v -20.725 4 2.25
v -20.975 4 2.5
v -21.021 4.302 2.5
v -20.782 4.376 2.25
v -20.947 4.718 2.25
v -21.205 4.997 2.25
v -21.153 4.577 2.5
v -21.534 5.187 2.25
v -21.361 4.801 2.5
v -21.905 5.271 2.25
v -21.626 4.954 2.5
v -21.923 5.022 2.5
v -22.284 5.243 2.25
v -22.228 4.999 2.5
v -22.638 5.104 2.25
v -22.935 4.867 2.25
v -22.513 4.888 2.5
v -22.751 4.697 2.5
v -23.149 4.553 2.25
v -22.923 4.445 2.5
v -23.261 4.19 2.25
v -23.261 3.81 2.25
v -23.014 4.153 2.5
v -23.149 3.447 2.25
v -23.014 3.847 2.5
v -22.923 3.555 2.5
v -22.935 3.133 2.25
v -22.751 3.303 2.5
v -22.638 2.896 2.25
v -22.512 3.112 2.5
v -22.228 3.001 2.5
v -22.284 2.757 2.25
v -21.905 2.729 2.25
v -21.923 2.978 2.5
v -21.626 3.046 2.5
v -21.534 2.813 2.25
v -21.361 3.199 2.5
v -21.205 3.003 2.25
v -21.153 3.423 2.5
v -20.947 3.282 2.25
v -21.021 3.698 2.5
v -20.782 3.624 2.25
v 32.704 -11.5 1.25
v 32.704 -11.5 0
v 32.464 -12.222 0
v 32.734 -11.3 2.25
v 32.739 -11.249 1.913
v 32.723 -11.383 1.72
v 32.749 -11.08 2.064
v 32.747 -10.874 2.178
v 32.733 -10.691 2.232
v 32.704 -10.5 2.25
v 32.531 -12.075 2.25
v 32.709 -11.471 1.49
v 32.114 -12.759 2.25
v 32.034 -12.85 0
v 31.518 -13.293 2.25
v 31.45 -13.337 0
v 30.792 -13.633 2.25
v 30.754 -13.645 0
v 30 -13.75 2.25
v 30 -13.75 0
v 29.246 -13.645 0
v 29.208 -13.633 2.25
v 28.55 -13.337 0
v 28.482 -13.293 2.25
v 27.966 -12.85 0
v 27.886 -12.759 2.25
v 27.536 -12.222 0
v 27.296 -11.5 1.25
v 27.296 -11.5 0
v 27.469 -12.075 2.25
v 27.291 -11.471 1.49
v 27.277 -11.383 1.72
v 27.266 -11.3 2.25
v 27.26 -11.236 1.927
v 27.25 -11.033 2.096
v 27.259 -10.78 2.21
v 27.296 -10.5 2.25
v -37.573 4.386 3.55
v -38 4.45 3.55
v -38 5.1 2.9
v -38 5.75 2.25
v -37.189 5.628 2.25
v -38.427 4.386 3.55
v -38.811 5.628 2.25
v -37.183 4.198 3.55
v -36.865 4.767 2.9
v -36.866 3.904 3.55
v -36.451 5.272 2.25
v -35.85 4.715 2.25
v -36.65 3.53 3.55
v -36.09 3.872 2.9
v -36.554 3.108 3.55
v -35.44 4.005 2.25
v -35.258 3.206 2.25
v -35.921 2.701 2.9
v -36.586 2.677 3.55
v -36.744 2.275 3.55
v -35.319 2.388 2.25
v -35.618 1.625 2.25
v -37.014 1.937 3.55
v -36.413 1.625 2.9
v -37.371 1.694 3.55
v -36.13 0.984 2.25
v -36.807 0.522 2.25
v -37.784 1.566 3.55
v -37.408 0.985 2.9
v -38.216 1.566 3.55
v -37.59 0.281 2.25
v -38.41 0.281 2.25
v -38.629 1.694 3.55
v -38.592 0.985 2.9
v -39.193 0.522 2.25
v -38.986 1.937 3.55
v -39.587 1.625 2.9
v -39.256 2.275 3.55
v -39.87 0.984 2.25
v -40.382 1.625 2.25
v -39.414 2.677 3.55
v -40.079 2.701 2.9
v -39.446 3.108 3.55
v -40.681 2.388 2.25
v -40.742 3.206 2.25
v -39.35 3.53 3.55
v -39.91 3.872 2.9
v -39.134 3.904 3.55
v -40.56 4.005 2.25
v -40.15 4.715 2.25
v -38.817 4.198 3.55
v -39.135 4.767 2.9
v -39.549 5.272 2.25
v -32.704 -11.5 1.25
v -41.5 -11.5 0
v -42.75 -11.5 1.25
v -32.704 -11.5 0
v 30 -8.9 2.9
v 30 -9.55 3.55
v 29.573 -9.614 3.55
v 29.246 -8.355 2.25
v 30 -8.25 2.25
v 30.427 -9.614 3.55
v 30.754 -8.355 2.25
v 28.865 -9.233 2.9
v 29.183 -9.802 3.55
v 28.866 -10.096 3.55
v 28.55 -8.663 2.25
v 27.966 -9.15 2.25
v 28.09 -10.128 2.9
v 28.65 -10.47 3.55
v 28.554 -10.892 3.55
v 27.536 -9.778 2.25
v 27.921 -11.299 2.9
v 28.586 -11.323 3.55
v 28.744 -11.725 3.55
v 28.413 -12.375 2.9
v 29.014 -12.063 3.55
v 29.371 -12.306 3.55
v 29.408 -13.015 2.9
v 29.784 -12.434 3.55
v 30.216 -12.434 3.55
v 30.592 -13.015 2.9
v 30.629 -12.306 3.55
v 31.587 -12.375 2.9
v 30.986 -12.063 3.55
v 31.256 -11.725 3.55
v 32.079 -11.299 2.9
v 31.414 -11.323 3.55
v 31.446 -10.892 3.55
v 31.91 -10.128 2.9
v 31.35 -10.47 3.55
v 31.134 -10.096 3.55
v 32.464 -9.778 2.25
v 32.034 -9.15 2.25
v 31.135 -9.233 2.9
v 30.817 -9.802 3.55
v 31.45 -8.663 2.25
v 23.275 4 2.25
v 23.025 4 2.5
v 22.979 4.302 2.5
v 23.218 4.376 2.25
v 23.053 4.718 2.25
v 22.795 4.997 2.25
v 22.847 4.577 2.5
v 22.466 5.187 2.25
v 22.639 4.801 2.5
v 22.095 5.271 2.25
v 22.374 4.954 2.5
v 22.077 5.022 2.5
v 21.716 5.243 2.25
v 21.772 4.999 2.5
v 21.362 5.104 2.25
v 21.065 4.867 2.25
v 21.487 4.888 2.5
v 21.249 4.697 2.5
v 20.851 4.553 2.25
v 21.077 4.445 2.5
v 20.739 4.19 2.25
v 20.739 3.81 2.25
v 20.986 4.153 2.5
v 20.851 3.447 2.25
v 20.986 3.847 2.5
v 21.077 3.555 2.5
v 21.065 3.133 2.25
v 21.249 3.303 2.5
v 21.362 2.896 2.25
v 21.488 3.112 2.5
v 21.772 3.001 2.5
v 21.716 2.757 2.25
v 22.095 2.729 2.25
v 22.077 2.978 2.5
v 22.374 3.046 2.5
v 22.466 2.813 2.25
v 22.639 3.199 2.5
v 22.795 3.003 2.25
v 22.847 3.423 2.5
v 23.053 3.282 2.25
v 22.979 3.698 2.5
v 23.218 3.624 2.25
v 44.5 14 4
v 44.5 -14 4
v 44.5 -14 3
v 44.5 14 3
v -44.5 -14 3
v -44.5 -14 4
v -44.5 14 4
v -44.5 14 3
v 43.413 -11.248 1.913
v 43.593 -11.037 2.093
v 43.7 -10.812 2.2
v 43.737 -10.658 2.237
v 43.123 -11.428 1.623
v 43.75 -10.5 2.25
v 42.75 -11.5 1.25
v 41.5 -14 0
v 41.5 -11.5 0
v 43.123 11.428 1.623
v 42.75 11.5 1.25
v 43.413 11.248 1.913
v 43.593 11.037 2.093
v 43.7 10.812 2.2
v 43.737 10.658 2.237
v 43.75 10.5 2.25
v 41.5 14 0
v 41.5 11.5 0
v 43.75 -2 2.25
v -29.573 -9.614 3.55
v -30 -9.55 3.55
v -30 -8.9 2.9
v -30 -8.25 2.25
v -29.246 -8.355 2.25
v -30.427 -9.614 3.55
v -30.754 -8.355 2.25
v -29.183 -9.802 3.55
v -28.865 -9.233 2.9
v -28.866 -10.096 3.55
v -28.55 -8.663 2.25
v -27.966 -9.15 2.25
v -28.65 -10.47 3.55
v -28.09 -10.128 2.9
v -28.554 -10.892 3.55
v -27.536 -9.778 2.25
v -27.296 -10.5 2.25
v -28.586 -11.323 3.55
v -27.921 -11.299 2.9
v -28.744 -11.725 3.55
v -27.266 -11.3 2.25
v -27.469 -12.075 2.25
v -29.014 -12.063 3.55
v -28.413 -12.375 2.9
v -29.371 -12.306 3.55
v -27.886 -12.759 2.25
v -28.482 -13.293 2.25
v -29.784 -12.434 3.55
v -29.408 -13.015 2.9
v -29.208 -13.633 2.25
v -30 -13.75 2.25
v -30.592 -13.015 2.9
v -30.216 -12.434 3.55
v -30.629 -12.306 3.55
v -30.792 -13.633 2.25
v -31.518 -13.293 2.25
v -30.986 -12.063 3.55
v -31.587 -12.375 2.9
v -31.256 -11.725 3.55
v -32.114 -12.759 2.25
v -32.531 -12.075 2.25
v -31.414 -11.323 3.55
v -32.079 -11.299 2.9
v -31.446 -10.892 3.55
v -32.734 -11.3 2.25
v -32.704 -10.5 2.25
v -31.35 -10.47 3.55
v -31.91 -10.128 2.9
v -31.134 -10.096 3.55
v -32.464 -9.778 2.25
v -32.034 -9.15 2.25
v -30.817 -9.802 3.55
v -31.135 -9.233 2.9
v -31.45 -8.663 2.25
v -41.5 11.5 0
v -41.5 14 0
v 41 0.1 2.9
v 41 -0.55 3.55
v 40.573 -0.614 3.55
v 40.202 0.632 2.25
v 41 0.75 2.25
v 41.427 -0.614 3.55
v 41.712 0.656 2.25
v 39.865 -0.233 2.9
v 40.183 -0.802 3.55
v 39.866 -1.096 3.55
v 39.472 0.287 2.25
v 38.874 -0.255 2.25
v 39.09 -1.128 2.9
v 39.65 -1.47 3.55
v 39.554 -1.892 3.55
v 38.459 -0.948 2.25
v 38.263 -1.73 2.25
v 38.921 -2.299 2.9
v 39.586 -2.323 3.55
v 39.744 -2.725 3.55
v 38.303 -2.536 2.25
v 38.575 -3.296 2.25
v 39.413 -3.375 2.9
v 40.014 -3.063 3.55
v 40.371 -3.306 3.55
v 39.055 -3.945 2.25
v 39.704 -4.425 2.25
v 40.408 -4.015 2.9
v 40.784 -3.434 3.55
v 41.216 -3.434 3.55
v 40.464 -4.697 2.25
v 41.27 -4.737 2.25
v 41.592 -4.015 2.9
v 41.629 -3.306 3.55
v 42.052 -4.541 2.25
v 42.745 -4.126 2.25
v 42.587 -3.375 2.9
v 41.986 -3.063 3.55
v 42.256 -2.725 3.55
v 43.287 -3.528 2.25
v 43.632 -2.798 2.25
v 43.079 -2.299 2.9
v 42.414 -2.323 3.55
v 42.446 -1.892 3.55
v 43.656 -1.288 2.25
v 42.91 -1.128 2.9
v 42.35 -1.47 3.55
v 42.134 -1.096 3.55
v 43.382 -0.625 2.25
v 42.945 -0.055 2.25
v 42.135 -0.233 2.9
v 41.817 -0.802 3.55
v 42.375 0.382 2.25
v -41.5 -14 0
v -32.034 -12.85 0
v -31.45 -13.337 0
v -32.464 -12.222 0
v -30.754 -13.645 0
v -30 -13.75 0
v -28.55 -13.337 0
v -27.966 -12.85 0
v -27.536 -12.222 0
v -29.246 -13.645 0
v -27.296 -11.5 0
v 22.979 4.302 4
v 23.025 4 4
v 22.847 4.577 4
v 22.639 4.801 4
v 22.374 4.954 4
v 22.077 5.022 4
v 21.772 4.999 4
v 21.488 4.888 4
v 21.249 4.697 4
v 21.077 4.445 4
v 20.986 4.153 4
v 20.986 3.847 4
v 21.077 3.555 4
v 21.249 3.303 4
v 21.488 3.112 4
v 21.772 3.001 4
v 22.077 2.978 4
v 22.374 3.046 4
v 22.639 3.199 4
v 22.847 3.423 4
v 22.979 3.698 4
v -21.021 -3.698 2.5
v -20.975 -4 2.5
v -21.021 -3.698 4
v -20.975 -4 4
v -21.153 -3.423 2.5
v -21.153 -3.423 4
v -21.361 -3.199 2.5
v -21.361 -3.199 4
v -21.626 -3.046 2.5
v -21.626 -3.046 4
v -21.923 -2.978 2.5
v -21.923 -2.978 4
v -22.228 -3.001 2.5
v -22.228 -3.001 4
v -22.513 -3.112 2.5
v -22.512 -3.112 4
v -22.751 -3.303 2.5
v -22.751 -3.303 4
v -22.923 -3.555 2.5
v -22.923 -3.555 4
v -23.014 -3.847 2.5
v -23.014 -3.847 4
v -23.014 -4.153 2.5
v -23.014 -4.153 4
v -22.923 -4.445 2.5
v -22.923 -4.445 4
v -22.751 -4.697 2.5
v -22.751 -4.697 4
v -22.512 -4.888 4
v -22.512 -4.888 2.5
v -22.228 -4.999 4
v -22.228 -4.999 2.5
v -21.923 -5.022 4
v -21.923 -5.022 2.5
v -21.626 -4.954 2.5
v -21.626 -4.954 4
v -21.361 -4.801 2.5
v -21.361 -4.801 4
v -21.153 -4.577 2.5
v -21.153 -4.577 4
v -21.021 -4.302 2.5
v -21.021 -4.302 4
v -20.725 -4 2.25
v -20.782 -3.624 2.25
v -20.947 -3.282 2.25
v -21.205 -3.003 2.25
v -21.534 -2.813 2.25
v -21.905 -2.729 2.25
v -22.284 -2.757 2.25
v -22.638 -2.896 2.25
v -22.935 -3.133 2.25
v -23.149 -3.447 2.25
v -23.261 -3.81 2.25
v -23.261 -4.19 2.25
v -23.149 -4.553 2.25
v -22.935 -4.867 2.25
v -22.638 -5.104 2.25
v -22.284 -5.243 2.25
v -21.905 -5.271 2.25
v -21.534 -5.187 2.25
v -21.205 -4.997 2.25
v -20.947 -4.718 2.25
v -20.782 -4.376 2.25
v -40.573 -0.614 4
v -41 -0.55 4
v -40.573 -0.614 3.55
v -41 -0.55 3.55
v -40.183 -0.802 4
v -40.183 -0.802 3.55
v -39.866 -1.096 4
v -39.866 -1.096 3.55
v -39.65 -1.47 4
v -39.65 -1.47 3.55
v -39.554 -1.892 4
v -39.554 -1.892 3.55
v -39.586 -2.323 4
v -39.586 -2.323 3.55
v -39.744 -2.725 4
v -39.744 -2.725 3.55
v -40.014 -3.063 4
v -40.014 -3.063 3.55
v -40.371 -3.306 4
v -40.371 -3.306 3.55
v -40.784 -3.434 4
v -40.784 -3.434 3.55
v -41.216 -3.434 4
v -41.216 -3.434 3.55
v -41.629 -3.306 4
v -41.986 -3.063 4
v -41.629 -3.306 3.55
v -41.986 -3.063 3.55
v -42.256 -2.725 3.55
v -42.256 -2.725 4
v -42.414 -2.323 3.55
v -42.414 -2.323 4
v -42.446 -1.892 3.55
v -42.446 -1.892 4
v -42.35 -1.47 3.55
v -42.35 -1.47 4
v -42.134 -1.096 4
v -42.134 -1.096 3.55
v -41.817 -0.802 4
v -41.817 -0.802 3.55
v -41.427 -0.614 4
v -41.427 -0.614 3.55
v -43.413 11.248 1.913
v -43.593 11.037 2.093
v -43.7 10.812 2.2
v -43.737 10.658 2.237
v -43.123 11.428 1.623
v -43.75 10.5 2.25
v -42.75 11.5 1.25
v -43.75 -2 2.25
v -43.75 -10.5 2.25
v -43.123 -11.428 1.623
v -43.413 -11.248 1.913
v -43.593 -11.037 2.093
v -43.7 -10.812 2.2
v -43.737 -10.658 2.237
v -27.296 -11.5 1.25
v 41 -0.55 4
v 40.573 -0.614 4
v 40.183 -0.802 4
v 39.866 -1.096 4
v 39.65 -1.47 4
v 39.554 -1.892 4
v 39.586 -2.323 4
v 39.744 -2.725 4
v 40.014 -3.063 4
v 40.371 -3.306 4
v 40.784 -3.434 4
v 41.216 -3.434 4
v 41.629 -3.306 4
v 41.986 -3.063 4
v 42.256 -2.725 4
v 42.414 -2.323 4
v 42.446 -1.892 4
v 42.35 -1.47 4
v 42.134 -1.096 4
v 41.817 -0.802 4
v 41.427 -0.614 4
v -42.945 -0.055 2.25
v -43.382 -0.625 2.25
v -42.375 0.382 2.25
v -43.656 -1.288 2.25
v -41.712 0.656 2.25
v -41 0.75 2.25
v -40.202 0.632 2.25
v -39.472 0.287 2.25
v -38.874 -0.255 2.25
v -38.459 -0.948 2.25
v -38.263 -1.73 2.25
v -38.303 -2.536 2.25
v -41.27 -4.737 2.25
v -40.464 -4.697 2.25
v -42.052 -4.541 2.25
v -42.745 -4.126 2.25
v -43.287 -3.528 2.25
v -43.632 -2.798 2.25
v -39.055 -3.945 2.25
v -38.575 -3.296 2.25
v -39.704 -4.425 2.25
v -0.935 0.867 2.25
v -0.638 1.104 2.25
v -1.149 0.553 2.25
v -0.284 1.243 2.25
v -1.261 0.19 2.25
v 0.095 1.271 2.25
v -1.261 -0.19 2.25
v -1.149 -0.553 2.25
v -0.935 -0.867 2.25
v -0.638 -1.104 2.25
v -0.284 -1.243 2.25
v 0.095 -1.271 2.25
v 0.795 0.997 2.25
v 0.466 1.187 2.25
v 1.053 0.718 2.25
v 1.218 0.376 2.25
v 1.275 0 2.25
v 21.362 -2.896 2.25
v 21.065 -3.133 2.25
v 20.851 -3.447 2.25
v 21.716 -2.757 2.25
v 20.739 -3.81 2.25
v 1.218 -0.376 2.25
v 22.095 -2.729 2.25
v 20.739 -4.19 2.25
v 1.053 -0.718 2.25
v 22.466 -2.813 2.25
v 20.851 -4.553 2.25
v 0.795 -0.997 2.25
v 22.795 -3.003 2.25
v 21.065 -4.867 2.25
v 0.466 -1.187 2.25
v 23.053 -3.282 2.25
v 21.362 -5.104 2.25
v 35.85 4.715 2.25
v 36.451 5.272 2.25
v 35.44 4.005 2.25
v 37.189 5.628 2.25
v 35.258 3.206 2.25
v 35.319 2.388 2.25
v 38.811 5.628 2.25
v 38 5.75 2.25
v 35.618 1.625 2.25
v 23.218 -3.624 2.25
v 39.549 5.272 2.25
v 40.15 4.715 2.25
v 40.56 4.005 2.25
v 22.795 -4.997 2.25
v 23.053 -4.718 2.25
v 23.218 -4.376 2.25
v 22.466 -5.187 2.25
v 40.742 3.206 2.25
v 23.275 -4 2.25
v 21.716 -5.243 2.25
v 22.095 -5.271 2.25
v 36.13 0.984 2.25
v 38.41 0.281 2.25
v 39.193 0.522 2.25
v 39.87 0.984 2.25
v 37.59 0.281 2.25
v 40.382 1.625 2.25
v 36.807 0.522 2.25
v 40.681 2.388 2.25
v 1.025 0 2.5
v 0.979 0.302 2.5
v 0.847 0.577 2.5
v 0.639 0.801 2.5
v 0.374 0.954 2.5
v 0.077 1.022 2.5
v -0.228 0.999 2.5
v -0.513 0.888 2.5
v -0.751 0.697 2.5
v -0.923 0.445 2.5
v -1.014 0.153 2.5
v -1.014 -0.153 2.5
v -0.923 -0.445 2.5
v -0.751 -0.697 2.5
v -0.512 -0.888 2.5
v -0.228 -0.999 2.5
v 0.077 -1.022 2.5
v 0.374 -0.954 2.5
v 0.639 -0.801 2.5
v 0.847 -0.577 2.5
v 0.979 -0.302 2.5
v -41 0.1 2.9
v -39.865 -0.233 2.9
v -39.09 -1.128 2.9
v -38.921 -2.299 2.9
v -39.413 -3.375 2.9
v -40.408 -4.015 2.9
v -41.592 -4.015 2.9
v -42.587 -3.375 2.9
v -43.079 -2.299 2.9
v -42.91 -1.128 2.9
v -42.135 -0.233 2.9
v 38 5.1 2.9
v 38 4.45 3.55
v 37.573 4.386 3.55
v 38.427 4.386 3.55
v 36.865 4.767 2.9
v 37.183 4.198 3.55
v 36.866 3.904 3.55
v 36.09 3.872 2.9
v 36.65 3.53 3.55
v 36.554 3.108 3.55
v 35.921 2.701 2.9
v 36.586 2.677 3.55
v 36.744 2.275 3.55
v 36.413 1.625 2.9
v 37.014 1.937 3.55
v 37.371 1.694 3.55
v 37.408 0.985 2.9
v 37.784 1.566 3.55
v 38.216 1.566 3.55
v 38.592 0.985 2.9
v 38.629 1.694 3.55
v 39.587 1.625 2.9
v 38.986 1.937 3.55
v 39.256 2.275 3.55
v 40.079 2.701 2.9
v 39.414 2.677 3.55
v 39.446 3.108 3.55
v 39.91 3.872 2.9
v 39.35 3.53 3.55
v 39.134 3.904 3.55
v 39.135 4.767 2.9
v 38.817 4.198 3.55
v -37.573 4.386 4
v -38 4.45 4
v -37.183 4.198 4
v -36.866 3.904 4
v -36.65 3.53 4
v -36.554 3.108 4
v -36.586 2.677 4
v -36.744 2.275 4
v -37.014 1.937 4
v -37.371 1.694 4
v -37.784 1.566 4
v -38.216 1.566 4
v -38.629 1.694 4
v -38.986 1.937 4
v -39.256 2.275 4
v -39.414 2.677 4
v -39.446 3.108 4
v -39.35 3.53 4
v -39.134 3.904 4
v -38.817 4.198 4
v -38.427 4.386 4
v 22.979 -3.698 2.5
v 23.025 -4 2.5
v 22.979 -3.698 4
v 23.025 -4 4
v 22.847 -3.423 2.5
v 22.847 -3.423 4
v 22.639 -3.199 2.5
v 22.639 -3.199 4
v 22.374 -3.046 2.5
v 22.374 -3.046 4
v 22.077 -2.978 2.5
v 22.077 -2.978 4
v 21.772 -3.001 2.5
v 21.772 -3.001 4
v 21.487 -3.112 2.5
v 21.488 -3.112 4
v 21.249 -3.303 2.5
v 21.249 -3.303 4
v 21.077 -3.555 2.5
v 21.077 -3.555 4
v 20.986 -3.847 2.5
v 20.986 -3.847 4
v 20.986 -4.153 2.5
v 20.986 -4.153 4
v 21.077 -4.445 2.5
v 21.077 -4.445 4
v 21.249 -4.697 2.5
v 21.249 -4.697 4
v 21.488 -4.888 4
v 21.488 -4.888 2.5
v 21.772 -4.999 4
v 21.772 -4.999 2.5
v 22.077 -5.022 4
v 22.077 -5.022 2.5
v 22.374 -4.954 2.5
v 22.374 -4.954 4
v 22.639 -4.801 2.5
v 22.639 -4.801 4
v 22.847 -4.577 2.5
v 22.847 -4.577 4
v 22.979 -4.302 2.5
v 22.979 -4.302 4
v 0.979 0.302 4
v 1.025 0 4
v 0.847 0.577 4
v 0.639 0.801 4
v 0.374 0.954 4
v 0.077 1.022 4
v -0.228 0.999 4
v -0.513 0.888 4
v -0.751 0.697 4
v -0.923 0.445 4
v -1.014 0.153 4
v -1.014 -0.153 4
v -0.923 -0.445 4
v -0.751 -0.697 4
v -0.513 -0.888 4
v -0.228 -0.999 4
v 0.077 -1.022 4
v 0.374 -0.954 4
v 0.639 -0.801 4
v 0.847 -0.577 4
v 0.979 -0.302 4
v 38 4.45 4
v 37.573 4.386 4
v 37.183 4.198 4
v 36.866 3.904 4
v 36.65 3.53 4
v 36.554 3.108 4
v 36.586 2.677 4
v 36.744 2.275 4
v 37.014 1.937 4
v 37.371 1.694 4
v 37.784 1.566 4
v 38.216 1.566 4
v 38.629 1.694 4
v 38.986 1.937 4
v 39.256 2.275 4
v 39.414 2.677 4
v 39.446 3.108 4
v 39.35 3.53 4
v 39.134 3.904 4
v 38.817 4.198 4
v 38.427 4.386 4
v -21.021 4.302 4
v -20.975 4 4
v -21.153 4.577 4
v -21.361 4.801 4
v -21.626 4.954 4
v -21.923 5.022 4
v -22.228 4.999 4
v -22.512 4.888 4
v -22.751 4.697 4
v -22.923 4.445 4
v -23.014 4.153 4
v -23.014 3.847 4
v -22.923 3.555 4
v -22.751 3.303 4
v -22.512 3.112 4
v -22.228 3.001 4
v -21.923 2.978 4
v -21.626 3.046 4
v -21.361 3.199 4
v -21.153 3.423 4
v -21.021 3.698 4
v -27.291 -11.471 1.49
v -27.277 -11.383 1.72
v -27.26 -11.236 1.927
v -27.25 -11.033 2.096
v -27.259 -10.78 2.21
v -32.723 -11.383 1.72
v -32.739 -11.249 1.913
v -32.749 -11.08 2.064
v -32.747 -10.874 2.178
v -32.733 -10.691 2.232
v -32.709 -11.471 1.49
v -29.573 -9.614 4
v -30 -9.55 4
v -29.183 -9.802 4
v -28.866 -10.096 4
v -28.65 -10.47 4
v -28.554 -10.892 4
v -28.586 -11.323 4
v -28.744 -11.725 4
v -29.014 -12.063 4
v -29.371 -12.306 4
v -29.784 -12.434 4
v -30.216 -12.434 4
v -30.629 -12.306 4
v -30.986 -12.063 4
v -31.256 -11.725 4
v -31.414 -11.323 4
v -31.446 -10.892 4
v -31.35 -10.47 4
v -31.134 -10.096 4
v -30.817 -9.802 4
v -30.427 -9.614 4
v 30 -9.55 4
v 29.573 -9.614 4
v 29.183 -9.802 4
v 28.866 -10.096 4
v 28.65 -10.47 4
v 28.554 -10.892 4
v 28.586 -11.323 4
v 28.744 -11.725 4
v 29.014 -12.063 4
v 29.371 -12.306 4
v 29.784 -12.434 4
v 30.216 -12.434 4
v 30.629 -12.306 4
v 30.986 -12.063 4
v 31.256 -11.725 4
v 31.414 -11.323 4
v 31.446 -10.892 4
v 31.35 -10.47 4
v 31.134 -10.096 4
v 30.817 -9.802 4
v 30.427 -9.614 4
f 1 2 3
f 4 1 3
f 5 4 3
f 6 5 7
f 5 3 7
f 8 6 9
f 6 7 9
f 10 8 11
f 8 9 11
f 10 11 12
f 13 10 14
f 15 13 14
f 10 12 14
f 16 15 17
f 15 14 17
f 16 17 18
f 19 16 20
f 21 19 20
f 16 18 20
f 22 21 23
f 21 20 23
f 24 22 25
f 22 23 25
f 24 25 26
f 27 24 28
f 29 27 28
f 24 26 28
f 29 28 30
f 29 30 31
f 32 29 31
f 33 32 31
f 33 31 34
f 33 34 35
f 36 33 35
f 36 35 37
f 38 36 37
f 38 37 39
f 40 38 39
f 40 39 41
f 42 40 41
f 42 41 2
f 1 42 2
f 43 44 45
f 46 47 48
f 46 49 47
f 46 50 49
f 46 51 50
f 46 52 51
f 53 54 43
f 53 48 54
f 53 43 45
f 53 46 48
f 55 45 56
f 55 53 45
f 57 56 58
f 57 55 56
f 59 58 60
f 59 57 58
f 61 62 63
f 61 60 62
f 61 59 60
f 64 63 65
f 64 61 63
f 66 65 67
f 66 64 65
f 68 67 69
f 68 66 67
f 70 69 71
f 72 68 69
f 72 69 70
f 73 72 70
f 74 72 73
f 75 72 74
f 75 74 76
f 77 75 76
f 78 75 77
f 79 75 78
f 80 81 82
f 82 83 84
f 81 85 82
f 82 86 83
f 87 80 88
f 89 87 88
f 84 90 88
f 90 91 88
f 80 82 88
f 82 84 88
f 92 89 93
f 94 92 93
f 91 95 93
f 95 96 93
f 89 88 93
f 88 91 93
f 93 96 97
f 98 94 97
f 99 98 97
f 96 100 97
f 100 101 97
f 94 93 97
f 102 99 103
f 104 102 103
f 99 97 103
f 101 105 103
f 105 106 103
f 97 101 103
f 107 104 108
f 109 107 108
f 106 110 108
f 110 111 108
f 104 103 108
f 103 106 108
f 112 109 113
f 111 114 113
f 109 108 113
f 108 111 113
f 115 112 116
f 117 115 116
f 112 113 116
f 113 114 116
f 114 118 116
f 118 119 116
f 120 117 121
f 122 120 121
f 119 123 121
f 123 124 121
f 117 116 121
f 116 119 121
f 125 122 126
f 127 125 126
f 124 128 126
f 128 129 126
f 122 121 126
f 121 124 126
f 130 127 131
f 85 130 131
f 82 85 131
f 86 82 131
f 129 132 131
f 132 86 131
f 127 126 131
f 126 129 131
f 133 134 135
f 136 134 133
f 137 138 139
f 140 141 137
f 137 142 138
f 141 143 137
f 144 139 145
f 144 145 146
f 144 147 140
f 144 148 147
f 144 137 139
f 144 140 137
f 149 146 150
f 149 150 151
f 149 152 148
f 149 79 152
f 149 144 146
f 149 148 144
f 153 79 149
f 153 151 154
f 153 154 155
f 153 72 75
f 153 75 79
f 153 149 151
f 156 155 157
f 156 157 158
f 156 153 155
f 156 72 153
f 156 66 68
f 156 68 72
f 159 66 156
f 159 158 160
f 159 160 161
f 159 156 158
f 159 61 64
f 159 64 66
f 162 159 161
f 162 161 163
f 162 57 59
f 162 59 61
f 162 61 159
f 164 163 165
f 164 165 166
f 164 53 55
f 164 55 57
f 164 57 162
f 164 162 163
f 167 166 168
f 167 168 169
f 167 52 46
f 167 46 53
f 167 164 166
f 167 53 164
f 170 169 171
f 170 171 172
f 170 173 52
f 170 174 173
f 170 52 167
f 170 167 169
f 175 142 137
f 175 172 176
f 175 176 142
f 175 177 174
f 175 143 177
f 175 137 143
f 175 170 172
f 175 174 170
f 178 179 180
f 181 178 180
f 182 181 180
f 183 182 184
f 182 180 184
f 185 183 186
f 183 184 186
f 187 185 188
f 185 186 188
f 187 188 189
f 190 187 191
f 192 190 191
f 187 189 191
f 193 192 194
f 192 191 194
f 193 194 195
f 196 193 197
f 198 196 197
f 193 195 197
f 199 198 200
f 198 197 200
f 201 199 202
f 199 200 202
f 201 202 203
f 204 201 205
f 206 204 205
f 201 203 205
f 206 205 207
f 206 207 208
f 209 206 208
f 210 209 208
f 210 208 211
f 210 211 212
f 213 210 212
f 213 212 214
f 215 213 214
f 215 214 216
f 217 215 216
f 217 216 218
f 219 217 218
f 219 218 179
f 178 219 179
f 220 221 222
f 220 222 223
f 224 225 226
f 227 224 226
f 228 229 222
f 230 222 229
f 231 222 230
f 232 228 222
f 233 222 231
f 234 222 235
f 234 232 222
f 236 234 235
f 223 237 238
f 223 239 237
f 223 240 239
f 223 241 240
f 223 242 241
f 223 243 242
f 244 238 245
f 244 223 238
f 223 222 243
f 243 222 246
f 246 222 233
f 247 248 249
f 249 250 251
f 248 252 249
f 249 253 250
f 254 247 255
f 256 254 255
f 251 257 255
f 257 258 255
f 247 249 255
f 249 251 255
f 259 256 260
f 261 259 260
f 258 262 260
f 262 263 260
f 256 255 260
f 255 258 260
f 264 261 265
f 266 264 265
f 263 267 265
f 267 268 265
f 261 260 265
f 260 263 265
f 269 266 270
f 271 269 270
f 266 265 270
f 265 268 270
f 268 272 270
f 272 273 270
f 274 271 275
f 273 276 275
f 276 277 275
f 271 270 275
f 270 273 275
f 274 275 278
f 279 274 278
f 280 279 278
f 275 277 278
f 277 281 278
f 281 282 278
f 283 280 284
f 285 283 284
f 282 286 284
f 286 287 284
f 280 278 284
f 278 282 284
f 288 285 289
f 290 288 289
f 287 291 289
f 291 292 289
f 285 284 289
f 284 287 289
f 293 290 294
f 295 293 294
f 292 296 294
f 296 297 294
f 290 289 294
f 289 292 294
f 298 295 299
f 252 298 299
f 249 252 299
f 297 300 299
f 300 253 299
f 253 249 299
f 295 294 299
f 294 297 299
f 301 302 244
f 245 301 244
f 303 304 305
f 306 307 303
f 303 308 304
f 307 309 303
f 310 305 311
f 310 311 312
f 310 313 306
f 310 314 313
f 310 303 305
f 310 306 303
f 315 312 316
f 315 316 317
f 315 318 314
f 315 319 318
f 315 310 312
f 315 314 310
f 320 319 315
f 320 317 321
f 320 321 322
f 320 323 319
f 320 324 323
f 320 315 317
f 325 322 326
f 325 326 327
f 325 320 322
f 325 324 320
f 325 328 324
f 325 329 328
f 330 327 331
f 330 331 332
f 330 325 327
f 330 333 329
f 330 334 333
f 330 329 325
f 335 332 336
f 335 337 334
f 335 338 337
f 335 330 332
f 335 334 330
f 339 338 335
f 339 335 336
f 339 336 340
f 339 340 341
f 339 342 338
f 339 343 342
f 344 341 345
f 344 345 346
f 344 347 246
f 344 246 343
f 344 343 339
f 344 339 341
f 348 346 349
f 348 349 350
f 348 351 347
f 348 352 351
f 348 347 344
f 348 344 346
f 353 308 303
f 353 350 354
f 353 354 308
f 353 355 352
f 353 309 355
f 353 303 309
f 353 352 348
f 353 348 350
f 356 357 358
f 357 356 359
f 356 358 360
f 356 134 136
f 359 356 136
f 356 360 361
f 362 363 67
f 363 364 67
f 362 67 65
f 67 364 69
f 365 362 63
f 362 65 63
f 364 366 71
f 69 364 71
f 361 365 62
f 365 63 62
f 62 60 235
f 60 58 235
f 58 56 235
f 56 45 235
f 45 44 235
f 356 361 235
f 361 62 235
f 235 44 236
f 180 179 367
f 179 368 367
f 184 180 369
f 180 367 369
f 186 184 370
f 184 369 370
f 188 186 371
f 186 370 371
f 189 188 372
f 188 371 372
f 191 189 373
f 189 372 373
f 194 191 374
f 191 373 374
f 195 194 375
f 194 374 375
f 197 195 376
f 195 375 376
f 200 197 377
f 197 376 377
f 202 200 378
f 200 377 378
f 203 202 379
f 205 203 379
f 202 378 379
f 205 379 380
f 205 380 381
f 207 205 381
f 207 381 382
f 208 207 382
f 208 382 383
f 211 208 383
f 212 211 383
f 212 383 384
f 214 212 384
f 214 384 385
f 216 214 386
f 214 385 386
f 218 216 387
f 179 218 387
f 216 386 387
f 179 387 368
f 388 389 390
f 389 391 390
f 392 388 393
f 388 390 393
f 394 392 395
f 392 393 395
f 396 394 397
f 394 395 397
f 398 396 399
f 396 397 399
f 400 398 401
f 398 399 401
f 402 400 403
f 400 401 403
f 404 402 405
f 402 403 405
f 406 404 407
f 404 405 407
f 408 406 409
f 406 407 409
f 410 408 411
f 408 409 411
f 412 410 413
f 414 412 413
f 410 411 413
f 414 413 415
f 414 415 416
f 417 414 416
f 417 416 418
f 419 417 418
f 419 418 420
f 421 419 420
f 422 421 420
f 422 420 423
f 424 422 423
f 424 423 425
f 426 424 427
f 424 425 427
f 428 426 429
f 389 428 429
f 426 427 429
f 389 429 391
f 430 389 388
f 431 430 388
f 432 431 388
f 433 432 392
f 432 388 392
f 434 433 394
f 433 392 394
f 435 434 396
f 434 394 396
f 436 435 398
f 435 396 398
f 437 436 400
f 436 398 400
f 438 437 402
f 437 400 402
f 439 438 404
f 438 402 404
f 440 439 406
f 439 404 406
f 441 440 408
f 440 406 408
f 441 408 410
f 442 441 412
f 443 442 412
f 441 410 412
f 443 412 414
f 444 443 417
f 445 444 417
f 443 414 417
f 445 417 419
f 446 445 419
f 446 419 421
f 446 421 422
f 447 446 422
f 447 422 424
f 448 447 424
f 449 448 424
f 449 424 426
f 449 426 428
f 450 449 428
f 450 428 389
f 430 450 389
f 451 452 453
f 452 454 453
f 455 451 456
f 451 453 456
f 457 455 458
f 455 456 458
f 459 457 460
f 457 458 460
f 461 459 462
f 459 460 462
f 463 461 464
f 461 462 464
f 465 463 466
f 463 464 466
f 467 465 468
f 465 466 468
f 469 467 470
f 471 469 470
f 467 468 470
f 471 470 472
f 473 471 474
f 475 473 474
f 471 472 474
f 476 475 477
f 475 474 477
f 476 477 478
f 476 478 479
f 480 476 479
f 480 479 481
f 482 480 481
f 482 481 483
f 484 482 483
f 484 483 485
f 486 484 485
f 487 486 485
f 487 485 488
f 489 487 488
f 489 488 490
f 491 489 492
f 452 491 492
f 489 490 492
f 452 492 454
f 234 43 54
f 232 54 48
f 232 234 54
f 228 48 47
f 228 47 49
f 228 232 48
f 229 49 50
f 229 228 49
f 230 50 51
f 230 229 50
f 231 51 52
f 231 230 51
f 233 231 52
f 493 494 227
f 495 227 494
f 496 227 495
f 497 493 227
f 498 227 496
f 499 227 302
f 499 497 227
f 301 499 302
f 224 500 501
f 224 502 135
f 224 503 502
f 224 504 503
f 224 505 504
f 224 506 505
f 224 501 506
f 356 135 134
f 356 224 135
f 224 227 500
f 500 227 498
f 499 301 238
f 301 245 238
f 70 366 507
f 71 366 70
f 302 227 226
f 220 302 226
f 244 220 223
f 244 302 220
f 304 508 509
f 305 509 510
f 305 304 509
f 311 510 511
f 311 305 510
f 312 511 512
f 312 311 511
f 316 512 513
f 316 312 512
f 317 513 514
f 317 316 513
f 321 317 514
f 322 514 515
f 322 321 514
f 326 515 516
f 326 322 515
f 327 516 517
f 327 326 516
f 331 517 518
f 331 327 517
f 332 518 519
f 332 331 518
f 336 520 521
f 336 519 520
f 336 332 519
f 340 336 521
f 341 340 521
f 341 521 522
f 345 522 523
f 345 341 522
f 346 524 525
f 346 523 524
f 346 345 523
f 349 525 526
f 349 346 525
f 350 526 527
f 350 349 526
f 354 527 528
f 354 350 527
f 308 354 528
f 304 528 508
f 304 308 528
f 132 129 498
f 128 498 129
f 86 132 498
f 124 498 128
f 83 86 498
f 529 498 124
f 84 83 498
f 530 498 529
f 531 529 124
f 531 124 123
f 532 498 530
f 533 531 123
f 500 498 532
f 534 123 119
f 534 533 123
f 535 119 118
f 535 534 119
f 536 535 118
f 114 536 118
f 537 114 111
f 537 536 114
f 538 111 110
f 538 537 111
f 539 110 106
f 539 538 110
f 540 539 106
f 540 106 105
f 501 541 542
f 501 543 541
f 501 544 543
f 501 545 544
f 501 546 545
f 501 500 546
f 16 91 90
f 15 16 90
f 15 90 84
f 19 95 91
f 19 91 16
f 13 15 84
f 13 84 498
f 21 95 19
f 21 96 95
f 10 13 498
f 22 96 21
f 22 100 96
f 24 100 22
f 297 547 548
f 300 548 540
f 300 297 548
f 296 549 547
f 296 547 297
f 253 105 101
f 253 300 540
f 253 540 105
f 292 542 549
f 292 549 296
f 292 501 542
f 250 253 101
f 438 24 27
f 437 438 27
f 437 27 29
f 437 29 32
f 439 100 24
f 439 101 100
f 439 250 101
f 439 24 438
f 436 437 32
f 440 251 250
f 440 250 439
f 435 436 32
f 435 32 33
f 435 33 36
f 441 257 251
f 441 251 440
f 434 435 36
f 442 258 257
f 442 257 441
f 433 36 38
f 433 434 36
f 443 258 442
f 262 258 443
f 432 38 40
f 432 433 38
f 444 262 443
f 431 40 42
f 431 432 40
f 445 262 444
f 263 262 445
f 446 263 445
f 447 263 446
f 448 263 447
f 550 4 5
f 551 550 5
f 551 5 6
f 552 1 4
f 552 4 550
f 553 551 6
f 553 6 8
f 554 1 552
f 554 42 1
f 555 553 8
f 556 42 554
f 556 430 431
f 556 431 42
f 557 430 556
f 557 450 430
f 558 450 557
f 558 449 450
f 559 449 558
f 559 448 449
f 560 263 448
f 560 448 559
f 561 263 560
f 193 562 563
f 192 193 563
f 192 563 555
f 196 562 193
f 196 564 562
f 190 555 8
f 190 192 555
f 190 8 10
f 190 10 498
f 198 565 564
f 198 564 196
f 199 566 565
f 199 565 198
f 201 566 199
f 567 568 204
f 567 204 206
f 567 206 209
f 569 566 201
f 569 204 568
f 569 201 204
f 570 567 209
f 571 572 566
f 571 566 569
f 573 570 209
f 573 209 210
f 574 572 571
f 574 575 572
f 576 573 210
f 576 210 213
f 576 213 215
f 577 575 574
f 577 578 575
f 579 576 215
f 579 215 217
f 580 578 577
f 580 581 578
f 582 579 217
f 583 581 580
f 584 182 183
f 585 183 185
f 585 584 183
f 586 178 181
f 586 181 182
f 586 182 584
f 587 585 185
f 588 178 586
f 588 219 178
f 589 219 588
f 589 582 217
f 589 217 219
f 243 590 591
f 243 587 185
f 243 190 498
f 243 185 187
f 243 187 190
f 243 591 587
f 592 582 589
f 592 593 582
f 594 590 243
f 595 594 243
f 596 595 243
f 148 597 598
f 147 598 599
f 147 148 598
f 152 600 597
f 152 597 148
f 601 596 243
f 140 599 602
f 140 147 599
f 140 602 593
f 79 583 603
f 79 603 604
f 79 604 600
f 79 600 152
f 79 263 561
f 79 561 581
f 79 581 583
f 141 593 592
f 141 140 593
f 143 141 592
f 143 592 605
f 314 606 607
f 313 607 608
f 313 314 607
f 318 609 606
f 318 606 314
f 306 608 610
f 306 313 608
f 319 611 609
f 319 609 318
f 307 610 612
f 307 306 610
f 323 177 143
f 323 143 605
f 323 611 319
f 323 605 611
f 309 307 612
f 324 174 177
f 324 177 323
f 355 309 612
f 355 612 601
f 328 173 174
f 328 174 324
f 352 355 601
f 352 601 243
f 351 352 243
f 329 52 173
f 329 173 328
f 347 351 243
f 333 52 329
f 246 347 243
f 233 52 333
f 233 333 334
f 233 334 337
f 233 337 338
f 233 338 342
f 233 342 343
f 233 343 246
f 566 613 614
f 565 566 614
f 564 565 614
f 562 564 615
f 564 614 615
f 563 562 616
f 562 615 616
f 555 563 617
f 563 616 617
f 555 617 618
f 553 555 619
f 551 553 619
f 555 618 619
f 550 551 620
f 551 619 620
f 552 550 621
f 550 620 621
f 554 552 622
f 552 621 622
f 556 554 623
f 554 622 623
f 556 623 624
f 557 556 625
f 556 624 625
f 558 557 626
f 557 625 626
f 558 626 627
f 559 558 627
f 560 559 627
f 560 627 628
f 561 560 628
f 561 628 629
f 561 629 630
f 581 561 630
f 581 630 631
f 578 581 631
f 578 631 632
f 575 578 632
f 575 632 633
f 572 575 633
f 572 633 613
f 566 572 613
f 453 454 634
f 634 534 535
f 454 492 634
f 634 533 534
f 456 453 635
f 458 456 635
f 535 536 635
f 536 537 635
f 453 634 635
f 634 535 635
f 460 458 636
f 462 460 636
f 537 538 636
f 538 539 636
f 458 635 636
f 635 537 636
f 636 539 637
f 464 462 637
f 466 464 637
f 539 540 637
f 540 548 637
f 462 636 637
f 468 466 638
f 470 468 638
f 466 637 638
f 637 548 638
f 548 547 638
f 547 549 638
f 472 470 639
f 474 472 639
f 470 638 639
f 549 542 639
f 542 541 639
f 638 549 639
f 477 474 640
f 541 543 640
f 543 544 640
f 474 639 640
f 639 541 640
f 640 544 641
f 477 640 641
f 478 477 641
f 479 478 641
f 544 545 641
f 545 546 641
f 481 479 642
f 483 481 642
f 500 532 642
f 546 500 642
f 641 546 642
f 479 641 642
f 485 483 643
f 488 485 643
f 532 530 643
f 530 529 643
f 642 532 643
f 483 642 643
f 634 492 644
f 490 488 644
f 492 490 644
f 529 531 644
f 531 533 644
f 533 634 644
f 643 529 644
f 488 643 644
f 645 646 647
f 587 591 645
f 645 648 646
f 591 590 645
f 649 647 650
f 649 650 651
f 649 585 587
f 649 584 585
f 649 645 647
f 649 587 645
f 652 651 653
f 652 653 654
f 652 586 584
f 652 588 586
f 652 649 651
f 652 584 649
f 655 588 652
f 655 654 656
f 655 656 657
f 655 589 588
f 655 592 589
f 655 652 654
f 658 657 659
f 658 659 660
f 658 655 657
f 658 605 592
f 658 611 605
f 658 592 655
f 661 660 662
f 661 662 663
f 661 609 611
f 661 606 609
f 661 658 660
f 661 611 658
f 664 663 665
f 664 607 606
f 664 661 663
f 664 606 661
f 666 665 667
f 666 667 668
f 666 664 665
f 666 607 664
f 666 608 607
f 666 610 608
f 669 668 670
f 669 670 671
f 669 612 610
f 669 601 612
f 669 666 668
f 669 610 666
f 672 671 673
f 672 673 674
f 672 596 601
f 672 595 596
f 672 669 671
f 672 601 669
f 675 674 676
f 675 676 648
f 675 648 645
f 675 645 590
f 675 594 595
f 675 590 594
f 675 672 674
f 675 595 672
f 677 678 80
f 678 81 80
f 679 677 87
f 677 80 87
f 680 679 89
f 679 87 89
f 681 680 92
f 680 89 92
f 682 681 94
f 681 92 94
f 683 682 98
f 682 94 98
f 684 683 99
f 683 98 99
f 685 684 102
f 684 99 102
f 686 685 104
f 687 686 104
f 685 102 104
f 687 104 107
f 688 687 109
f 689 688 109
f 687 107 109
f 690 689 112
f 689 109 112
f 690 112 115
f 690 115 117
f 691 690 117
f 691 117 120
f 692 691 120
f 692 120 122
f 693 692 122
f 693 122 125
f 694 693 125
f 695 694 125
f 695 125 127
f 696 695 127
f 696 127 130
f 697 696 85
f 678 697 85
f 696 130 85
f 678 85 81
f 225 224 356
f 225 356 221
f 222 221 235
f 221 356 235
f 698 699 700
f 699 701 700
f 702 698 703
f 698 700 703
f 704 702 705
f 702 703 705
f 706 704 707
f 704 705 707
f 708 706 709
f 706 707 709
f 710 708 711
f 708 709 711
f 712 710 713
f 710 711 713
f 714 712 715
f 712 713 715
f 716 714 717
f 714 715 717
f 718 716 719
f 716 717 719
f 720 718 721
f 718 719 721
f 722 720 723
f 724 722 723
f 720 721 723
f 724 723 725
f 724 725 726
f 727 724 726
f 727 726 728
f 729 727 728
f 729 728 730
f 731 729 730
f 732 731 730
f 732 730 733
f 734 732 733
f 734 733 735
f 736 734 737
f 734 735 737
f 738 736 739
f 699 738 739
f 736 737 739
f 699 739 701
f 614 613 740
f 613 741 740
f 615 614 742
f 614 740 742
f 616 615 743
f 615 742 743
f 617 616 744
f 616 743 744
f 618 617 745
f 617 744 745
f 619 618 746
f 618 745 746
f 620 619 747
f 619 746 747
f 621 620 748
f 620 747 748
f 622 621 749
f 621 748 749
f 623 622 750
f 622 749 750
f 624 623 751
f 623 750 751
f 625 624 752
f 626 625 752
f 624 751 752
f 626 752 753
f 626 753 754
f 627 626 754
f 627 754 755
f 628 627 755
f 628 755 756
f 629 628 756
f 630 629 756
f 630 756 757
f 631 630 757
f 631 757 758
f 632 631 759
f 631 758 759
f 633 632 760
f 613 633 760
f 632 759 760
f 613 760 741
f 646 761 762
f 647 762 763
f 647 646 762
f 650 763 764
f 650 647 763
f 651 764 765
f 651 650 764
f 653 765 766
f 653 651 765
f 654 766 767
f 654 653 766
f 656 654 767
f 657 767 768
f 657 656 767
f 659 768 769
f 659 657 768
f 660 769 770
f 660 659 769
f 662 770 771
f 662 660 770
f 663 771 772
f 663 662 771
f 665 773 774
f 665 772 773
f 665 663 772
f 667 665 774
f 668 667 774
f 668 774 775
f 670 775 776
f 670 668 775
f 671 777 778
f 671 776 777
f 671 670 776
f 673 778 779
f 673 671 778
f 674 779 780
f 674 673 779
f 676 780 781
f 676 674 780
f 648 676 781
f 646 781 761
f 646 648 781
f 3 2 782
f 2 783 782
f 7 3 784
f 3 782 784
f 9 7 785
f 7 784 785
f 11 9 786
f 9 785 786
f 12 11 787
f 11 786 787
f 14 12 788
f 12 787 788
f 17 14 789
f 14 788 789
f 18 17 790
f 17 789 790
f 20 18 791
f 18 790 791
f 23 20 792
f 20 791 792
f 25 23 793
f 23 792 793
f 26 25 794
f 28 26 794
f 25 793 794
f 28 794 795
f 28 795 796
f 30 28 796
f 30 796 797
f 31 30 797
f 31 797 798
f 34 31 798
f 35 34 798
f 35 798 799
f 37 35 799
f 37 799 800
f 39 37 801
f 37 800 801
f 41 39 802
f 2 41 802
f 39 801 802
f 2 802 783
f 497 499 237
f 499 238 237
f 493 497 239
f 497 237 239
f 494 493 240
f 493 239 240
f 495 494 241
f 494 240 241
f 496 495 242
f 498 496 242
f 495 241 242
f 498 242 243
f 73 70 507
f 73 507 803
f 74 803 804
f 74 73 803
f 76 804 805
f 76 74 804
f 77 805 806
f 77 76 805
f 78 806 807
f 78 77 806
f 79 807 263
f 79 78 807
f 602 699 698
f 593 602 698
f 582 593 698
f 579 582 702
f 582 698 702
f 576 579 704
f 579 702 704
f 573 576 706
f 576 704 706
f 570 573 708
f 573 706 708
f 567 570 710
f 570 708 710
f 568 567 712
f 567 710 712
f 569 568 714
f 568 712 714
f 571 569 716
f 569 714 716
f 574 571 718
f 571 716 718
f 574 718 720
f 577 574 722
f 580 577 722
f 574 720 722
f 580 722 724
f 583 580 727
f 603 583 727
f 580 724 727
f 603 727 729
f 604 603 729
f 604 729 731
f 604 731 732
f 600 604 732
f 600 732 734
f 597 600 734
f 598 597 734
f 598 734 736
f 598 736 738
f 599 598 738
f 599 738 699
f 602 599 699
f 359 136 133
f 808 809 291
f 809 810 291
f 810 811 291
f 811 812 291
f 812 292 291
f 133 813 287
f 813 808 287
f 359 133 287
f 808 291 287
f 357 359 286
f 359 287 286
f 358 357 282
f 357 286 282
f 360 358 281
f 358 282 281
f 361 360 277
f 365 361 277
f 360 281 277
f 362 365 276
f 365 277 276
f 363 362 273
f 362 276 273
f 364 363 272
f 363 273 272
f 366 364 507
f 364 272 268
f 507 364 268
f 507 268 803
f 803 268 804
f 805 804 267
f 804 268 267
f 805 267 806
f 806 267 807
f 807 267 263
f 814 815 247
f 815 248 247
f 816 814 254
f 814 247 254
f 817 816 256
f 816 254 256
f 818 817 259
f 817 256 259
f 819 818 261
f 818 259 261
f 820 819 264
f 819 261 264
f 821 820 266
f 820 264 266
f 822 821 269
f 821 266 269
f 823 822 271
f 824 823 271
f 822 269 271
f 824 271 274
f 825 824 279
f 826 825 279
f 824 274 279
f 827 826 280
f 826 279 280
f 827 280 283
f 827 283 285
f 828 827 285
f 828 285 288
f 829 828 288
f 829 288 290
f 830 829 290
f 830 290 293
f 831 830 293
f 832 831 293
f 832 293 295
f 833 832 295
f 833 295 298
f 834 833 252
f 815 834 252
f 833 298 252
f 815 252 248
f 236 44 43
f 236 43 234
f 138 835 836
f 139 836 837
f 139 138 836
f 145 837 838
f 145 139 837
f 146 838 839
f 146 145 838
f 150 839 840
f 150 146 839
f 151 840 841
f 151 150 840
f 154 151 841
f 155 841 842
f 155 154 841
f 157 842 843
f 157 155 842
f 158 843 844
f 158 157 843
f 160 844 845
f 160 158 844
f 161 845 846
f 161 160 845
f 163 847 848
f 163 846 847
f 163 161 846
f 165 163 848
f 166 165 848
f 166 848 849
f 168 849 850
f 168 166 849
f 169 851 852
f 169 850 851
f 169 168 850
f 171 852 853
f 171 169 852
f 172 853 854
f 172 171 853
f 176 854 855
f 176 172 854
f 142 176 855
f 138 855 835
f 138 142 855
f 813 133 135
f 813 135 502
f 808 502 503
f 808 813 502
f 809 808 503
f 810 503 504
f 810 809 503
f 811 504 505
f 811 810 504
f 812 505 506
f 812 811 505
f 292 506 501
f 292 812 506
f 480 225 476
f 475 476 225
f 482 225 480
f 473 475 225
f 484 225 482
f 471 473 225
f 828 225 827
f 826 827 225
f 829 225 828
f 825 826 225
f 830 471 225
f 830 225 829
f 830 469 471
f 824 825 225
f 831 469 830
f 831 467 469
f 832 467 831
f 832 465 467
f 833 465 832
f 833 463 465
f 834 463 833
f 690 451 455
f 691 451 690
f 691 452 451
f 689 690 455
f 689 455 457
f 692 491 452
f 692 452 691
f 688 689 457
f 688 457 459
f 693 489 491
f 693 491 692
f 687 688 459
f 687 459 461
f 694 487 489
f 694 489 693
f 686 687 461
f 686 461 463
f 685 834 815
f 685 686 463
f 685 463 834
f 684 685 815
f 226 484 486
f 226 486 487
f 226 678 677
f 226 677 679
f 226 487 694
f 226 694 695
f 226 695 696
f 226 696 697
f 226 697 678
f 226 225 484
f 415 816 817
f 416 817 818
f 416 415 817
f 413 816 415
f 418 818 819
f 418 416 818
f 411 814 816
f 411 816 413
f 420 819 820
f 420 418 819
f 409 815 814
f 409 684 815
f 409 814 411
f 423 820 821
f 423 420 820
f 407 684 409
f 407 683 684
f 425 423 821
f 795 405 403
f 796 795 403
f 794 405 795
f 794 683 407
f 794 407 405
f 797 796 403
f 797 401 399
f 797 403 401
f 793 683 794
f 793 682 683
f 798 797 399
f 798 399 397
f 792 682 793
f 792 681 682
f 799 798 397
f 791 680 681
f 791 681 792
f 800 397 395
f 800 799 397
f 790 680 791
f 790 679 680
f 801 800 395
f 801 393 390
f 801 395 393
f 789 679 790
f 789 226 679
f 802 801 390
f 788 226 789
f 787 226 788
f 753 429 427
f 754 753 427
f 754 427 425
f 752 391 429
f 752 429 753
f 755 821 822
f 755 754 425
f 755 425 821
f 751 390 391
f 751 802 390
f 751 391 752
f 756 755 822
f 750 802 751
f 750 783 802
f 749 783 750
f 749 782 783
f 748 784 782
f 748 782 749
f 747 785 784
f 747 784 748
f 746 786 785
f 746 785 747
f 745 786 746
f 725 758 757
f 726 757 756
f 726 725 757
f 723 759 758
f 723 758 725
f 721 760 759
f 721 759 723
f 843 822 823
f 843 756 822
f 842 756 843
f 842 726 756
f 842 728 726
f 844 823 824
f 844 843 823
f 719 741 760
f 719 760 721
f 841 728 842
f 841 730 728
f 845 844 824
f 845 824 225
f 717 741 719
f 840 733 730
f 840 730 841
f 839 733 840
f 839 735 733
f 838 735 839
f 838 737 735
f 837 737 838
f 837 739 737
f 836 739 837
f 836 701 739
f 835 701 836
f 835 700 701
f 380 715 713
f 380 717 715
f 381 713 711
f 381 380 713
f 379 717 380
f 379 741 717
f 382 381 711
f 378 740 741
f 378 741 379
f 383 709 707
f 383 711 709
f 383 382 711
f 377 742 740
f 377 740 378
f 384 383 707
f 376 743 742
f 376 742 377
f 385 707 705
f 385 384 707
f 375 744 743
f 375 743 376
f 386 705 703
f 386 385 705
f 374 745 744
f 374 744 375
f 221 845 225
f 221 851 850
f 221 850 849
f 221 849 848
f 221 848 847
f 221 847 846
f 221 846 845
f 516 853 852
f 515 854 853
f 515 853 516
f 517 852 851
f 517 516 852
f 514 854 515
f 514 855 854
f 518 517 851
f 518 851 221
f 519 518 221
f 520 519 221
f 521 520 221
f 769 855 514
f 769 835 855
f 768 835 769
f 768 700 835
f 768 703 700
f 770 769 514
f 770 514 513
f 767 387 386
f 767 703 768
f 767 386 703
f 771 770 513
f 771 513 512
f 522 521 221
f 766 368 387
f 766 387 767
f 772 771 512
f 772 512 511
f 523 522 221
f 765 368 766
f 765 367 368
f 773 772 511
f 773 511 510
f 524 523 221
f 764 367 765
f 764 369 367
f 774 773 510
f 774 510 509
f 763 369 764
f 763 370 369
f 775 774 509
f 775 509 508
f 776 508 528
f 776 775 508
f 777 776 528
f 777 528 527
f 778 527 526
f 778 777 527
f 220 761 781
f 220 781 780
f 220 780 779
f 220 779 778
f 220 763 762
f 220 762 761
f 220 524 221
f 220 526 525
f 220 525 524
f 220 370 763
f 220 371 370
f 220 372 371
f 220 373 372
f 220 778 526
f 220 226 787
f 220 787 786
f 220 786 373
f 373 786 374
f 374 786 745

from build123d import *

# Parameters (mm, degrees)
SKETCH1_W                                      = 94
SKETCH1_H                                      = 28
BOSS_EXTRUDE1_DEPTH                            = 4
CHAMFER1_SIZE                                  = 5.5
CUT_EXTRUDE2_DEPTH                             = 48.772900268
CUT_EXTRUDE2_DEPTH_BACK                        = 48.772900268
SKETCH9_W                                      = 30.391833943
SKETCH9_H                                      = 28
SHELL1_START                                   = -11.5
SHELL1_DEPTH                                   = 23
FILLET1_R                                      = 1
CSK_FOR_M2_5_FLAT_HEAD_MACHINE_SCREW1_AT_COUNT = 2
CSK_FOR_M2_5_FLAT_HEAD_MACHINE_SCREW1_AT_PITCH = 5.830951895
CSK_FOR_M2_5_FLAT_HEAD_MACHINE_SCREW_2_COUNT   = 2
CSK_FOR_M2_5_FLAT_HEAD_MACHINE_SCREW_2_PITCH   = 16.124515497
SKETCH8_R                                      = 2.75
CUT_EXTRUDE1_DEPTH                             = 47.704523336
M2_5X0_45_TAPPED_HOLE1_D                       = 2.05
M2_5X0_45_TAPPED_HOLE1_DEPTH                   = 6
M2_5X0_45_TAPPED_HOLE1_CSINK_D                 = 2.55
M2_5X0_45_TAPPED_HOLE1_CSINK_ANGLE             = 90
M2_5X0_45_TAPPED_HOLE1_TIP                     = 0.615882135


# Read off the part's stored shape, not the designer's step: Shell1
with BuildPart() as part:
    # Sketch1 → Boss-Extrude1 (new body)
    with BuildSketch(Plane.XY):
        Rectangle(SKETCH1_W, SKETCH1_H)
    extrude(amount=BOSS_EXTRUDE1_DEPTH)

    # Chamfer1
    # the kernel refuses this chamfer: 5.5 mm, written as the material it takes off along each edge
    with BuildSketch(Plane(origin=(47, 28.144256434, 0), x_dir=(0.027495876610585942, 0, 0.9996219169112968), z_dir=(0, -1, 0)), Plane(origin=(-47, -28.144256434, 0), x_dir=(-0.027495876610585942, 0, 0.9996219169112968), z_dir=(0, 1, 0))) as chamfer1_piece_1:
        Polygon((CHAMFER1_SIZE * 0.999621916911, CHAMFER1_SIZE * 0.0274958766106), (-CHAMFER1_SIZE * 0.0274958766106, CHAMFER1_SIZE * 0.999621916911), (0, 0), align=None)
    extrude(amount=56.288512868, mode=Mode.SUBTRACT)

    # Sketch9 → Cut-Extrude2 (cut, two sides: drawn at the far end of the back side and taken through both)
    with BuildSketch(Plane(origin=(0, 0, 0), x_dir=(-1, 0, 0), z_dir=(0, 0, -1)).offset(-CUT_EXTRUDE2_DEPTH_BACK)):
        with Locations((-59.695916972, 0)):
            Rectangle(SKETCH9_W, SKETCH9_H)
        with Locations((59.695916972, 0)):
            Rectangle(SKETCH9_W, SKETCH9_H)
    extrude(amount=CUT_EXTRUDE2_DEPTH + CUT_EXTRUDE2_DEPTH_BACK, mode=Mode.SUBTRACT)

    # Shell1 outline → Shell1 (cut)
    with BuildSketch(Plane(origin=(0, 0, 0), x_dir=(1, 0, 0), z_dir=(0, 1, 0)).offset(SHELL1_START)):
        Polygon((-41.5, 0), (-43.75, -2.25), (43.75, -2.25), (41.5, 0), align=None)
    extrude(amount=SHELL1_DEPTH, mode=Mode.SUBTRACT)

    # Fillet1
    fillet1_edges = [part.edges().sort_by_distance(p)[0] for p in [
        (0, 11.5, 2.25),
        (0, -11.5, 2.25),
    ]]
    fillet(fillet1_edges, radius=FILLET1_R)

    # Sketch5 → CSK for M2.5 Flat Head Machine Screw1 (revolve, cut)
    with BuildSketch(Plane(origin=(38, 3, 2.25), x_dir=(0, 1, 0), z_dir=(1, 0, 0))):
        Polygon((0, 0), (0, 7.321247898), (1.45, 6.45), (1.45, 1.3), (2.75, 0), align=None)
    csk_for_m2_5_flat_head_machine_screw1 = revolve(axis=Axis((38, 3, -4.1), (0, 0, 1)), mode=Mode.SUBTRACT)

    # CSK for M2.5 Flat Head Machine Screw1 at: CSK for M2.5 Flat Head Machine Screw1 ×2
    with Locations(*[Vector(0.5144957554275275, -0.8574929257125438, 0) * (i * CSK_FOR_M2_5_FLAT_HEAD_MACHINE_SCREW1_AT_PITCH) for i in range(1, CSK_FOR_M2_5_FLAT_HEAD_MACHINE_SCREW1_AT_COUNT)]):
        add(csk_for_m2_5_flat_head_machine_screw1, mode=Mode.SUBTRACT)

    # CSK for M2.5 Flat Head Machine Screw 2: CSK for M2.5 Flat Head Machine Screw1 ×2
    with Locations(*[Vector(-0.4961389383568334, -0.8682431421244594, 0) * (i * CSK_FOR_M2_5_FLAT_HEAD_MACHINE_SCREW_2_PITCH) for i in range(1, CSK_FOR_M2_5_FLAT_HEAD_MACHINE_SCREW_2_COUNT)]):
        add(csk_for_m2_5_flat_head_machine_screw1, mode=Mode.SUBTRACT)

    # Sketch8 → Cut-Extrude1 (cut, through all)
    with BuildSketch(Plane(origin=(0, 0, 2.25), x_dir=(-1, 0, 0), z_dir=(0, 0, -1))):
        with Locations((-30, -11)):
            Circle(SKETCH8_R)
    cut_extrude1 = extrude(amount=CUT_EXTRUDE1_DEPTH, mode=Mode.SUBTRACT)

    # Mirror1: CSK for M2.5 Flat Head Machine Screw1, Cut-Extrude1 across plane
    add(csk_for_m2_5_flat_head_machine_screw1.mirror(Plane(origin=(0, 0, 0), x_dir=(0, 0, 1), z_dir=(1, 0, 0))), mode=Mode.SUBTRACT)
    add(cut_extrude1.mirror(Plane(origin=(0, 0, 0), x_dir=(0, 0, 1), z_dir=(1, 0, 0))), mode=Mode.SUBTRACT)

    # Mirror1 copy 1 sketch → Mirror1 copy 1 (revolve, cut)
    with BuildSketch(Plane(origin=(-41, -2, 2.25), x_dir=(0, 1, 0), z_dir=(-1, 0, 0))):
        Polygon((0, 0), (0, -7.321247898), (1.45, -6.45), (1.45, -1.3), (2.75, 0), align=None)
    revolve(axis=Axis((-41, -2, -4.1), (0, 0, -1)), mode=Mode.SUBTRACT)

    # Mirror1 copy 2 sketch → Mirror1 copy 2 (revolve, cut)
    with BuildSketch(Plane(origin=(-30, -11, 2.25), x_dir=(0, 1, 0), z_dir=(-1, 0, 0))):
        Polygon((0, 0), (0, -7.321247898), (1.45, -6.45), (1.45, -1.3), (2.75, 0), align=None)
    revolve(axis=Axis((-30, -11, -4.1), (0, 0, -1)), mode=Mode.SUBTRACT)

    # M2.5x0.45 Tapped Hole1
    with Locations(Plane(origin=(0, 0, 2.25), x_dir=(-1, 0, 0), z_dir=(0, 0, -1))):
        with Locations((0, 0), (-22, 4), (-22, -4), (22, -4), (22, 4)):
            CounterSinkHole(M2_5X0_45_TAPPED_HOLE1_D / 2, M2_5X0_45_TAPPED_HOLE1_CSINK_D / 2, depth=M2_5X0_45_TAPPED_HOLE1_DEPTH, counter_sink_angle=M2_5X0_45_TAPPED_HOLE1_CSINK_ANGLE)
            with Locations((0, 0, -(M2_5X0_45_TAPPED_HOLE1_DEPTH + M2_5X0_45_TAPPED_HOLE1_TIP / 2))):  # 118° drill point
                Cone(0, M2_5X0_45_TAPPED_HOLE1_D / 2, M2_5X0_45_TAPPED_HOLE1_TIP, mode=Mode.SUBTRACT)


solid = part.part
